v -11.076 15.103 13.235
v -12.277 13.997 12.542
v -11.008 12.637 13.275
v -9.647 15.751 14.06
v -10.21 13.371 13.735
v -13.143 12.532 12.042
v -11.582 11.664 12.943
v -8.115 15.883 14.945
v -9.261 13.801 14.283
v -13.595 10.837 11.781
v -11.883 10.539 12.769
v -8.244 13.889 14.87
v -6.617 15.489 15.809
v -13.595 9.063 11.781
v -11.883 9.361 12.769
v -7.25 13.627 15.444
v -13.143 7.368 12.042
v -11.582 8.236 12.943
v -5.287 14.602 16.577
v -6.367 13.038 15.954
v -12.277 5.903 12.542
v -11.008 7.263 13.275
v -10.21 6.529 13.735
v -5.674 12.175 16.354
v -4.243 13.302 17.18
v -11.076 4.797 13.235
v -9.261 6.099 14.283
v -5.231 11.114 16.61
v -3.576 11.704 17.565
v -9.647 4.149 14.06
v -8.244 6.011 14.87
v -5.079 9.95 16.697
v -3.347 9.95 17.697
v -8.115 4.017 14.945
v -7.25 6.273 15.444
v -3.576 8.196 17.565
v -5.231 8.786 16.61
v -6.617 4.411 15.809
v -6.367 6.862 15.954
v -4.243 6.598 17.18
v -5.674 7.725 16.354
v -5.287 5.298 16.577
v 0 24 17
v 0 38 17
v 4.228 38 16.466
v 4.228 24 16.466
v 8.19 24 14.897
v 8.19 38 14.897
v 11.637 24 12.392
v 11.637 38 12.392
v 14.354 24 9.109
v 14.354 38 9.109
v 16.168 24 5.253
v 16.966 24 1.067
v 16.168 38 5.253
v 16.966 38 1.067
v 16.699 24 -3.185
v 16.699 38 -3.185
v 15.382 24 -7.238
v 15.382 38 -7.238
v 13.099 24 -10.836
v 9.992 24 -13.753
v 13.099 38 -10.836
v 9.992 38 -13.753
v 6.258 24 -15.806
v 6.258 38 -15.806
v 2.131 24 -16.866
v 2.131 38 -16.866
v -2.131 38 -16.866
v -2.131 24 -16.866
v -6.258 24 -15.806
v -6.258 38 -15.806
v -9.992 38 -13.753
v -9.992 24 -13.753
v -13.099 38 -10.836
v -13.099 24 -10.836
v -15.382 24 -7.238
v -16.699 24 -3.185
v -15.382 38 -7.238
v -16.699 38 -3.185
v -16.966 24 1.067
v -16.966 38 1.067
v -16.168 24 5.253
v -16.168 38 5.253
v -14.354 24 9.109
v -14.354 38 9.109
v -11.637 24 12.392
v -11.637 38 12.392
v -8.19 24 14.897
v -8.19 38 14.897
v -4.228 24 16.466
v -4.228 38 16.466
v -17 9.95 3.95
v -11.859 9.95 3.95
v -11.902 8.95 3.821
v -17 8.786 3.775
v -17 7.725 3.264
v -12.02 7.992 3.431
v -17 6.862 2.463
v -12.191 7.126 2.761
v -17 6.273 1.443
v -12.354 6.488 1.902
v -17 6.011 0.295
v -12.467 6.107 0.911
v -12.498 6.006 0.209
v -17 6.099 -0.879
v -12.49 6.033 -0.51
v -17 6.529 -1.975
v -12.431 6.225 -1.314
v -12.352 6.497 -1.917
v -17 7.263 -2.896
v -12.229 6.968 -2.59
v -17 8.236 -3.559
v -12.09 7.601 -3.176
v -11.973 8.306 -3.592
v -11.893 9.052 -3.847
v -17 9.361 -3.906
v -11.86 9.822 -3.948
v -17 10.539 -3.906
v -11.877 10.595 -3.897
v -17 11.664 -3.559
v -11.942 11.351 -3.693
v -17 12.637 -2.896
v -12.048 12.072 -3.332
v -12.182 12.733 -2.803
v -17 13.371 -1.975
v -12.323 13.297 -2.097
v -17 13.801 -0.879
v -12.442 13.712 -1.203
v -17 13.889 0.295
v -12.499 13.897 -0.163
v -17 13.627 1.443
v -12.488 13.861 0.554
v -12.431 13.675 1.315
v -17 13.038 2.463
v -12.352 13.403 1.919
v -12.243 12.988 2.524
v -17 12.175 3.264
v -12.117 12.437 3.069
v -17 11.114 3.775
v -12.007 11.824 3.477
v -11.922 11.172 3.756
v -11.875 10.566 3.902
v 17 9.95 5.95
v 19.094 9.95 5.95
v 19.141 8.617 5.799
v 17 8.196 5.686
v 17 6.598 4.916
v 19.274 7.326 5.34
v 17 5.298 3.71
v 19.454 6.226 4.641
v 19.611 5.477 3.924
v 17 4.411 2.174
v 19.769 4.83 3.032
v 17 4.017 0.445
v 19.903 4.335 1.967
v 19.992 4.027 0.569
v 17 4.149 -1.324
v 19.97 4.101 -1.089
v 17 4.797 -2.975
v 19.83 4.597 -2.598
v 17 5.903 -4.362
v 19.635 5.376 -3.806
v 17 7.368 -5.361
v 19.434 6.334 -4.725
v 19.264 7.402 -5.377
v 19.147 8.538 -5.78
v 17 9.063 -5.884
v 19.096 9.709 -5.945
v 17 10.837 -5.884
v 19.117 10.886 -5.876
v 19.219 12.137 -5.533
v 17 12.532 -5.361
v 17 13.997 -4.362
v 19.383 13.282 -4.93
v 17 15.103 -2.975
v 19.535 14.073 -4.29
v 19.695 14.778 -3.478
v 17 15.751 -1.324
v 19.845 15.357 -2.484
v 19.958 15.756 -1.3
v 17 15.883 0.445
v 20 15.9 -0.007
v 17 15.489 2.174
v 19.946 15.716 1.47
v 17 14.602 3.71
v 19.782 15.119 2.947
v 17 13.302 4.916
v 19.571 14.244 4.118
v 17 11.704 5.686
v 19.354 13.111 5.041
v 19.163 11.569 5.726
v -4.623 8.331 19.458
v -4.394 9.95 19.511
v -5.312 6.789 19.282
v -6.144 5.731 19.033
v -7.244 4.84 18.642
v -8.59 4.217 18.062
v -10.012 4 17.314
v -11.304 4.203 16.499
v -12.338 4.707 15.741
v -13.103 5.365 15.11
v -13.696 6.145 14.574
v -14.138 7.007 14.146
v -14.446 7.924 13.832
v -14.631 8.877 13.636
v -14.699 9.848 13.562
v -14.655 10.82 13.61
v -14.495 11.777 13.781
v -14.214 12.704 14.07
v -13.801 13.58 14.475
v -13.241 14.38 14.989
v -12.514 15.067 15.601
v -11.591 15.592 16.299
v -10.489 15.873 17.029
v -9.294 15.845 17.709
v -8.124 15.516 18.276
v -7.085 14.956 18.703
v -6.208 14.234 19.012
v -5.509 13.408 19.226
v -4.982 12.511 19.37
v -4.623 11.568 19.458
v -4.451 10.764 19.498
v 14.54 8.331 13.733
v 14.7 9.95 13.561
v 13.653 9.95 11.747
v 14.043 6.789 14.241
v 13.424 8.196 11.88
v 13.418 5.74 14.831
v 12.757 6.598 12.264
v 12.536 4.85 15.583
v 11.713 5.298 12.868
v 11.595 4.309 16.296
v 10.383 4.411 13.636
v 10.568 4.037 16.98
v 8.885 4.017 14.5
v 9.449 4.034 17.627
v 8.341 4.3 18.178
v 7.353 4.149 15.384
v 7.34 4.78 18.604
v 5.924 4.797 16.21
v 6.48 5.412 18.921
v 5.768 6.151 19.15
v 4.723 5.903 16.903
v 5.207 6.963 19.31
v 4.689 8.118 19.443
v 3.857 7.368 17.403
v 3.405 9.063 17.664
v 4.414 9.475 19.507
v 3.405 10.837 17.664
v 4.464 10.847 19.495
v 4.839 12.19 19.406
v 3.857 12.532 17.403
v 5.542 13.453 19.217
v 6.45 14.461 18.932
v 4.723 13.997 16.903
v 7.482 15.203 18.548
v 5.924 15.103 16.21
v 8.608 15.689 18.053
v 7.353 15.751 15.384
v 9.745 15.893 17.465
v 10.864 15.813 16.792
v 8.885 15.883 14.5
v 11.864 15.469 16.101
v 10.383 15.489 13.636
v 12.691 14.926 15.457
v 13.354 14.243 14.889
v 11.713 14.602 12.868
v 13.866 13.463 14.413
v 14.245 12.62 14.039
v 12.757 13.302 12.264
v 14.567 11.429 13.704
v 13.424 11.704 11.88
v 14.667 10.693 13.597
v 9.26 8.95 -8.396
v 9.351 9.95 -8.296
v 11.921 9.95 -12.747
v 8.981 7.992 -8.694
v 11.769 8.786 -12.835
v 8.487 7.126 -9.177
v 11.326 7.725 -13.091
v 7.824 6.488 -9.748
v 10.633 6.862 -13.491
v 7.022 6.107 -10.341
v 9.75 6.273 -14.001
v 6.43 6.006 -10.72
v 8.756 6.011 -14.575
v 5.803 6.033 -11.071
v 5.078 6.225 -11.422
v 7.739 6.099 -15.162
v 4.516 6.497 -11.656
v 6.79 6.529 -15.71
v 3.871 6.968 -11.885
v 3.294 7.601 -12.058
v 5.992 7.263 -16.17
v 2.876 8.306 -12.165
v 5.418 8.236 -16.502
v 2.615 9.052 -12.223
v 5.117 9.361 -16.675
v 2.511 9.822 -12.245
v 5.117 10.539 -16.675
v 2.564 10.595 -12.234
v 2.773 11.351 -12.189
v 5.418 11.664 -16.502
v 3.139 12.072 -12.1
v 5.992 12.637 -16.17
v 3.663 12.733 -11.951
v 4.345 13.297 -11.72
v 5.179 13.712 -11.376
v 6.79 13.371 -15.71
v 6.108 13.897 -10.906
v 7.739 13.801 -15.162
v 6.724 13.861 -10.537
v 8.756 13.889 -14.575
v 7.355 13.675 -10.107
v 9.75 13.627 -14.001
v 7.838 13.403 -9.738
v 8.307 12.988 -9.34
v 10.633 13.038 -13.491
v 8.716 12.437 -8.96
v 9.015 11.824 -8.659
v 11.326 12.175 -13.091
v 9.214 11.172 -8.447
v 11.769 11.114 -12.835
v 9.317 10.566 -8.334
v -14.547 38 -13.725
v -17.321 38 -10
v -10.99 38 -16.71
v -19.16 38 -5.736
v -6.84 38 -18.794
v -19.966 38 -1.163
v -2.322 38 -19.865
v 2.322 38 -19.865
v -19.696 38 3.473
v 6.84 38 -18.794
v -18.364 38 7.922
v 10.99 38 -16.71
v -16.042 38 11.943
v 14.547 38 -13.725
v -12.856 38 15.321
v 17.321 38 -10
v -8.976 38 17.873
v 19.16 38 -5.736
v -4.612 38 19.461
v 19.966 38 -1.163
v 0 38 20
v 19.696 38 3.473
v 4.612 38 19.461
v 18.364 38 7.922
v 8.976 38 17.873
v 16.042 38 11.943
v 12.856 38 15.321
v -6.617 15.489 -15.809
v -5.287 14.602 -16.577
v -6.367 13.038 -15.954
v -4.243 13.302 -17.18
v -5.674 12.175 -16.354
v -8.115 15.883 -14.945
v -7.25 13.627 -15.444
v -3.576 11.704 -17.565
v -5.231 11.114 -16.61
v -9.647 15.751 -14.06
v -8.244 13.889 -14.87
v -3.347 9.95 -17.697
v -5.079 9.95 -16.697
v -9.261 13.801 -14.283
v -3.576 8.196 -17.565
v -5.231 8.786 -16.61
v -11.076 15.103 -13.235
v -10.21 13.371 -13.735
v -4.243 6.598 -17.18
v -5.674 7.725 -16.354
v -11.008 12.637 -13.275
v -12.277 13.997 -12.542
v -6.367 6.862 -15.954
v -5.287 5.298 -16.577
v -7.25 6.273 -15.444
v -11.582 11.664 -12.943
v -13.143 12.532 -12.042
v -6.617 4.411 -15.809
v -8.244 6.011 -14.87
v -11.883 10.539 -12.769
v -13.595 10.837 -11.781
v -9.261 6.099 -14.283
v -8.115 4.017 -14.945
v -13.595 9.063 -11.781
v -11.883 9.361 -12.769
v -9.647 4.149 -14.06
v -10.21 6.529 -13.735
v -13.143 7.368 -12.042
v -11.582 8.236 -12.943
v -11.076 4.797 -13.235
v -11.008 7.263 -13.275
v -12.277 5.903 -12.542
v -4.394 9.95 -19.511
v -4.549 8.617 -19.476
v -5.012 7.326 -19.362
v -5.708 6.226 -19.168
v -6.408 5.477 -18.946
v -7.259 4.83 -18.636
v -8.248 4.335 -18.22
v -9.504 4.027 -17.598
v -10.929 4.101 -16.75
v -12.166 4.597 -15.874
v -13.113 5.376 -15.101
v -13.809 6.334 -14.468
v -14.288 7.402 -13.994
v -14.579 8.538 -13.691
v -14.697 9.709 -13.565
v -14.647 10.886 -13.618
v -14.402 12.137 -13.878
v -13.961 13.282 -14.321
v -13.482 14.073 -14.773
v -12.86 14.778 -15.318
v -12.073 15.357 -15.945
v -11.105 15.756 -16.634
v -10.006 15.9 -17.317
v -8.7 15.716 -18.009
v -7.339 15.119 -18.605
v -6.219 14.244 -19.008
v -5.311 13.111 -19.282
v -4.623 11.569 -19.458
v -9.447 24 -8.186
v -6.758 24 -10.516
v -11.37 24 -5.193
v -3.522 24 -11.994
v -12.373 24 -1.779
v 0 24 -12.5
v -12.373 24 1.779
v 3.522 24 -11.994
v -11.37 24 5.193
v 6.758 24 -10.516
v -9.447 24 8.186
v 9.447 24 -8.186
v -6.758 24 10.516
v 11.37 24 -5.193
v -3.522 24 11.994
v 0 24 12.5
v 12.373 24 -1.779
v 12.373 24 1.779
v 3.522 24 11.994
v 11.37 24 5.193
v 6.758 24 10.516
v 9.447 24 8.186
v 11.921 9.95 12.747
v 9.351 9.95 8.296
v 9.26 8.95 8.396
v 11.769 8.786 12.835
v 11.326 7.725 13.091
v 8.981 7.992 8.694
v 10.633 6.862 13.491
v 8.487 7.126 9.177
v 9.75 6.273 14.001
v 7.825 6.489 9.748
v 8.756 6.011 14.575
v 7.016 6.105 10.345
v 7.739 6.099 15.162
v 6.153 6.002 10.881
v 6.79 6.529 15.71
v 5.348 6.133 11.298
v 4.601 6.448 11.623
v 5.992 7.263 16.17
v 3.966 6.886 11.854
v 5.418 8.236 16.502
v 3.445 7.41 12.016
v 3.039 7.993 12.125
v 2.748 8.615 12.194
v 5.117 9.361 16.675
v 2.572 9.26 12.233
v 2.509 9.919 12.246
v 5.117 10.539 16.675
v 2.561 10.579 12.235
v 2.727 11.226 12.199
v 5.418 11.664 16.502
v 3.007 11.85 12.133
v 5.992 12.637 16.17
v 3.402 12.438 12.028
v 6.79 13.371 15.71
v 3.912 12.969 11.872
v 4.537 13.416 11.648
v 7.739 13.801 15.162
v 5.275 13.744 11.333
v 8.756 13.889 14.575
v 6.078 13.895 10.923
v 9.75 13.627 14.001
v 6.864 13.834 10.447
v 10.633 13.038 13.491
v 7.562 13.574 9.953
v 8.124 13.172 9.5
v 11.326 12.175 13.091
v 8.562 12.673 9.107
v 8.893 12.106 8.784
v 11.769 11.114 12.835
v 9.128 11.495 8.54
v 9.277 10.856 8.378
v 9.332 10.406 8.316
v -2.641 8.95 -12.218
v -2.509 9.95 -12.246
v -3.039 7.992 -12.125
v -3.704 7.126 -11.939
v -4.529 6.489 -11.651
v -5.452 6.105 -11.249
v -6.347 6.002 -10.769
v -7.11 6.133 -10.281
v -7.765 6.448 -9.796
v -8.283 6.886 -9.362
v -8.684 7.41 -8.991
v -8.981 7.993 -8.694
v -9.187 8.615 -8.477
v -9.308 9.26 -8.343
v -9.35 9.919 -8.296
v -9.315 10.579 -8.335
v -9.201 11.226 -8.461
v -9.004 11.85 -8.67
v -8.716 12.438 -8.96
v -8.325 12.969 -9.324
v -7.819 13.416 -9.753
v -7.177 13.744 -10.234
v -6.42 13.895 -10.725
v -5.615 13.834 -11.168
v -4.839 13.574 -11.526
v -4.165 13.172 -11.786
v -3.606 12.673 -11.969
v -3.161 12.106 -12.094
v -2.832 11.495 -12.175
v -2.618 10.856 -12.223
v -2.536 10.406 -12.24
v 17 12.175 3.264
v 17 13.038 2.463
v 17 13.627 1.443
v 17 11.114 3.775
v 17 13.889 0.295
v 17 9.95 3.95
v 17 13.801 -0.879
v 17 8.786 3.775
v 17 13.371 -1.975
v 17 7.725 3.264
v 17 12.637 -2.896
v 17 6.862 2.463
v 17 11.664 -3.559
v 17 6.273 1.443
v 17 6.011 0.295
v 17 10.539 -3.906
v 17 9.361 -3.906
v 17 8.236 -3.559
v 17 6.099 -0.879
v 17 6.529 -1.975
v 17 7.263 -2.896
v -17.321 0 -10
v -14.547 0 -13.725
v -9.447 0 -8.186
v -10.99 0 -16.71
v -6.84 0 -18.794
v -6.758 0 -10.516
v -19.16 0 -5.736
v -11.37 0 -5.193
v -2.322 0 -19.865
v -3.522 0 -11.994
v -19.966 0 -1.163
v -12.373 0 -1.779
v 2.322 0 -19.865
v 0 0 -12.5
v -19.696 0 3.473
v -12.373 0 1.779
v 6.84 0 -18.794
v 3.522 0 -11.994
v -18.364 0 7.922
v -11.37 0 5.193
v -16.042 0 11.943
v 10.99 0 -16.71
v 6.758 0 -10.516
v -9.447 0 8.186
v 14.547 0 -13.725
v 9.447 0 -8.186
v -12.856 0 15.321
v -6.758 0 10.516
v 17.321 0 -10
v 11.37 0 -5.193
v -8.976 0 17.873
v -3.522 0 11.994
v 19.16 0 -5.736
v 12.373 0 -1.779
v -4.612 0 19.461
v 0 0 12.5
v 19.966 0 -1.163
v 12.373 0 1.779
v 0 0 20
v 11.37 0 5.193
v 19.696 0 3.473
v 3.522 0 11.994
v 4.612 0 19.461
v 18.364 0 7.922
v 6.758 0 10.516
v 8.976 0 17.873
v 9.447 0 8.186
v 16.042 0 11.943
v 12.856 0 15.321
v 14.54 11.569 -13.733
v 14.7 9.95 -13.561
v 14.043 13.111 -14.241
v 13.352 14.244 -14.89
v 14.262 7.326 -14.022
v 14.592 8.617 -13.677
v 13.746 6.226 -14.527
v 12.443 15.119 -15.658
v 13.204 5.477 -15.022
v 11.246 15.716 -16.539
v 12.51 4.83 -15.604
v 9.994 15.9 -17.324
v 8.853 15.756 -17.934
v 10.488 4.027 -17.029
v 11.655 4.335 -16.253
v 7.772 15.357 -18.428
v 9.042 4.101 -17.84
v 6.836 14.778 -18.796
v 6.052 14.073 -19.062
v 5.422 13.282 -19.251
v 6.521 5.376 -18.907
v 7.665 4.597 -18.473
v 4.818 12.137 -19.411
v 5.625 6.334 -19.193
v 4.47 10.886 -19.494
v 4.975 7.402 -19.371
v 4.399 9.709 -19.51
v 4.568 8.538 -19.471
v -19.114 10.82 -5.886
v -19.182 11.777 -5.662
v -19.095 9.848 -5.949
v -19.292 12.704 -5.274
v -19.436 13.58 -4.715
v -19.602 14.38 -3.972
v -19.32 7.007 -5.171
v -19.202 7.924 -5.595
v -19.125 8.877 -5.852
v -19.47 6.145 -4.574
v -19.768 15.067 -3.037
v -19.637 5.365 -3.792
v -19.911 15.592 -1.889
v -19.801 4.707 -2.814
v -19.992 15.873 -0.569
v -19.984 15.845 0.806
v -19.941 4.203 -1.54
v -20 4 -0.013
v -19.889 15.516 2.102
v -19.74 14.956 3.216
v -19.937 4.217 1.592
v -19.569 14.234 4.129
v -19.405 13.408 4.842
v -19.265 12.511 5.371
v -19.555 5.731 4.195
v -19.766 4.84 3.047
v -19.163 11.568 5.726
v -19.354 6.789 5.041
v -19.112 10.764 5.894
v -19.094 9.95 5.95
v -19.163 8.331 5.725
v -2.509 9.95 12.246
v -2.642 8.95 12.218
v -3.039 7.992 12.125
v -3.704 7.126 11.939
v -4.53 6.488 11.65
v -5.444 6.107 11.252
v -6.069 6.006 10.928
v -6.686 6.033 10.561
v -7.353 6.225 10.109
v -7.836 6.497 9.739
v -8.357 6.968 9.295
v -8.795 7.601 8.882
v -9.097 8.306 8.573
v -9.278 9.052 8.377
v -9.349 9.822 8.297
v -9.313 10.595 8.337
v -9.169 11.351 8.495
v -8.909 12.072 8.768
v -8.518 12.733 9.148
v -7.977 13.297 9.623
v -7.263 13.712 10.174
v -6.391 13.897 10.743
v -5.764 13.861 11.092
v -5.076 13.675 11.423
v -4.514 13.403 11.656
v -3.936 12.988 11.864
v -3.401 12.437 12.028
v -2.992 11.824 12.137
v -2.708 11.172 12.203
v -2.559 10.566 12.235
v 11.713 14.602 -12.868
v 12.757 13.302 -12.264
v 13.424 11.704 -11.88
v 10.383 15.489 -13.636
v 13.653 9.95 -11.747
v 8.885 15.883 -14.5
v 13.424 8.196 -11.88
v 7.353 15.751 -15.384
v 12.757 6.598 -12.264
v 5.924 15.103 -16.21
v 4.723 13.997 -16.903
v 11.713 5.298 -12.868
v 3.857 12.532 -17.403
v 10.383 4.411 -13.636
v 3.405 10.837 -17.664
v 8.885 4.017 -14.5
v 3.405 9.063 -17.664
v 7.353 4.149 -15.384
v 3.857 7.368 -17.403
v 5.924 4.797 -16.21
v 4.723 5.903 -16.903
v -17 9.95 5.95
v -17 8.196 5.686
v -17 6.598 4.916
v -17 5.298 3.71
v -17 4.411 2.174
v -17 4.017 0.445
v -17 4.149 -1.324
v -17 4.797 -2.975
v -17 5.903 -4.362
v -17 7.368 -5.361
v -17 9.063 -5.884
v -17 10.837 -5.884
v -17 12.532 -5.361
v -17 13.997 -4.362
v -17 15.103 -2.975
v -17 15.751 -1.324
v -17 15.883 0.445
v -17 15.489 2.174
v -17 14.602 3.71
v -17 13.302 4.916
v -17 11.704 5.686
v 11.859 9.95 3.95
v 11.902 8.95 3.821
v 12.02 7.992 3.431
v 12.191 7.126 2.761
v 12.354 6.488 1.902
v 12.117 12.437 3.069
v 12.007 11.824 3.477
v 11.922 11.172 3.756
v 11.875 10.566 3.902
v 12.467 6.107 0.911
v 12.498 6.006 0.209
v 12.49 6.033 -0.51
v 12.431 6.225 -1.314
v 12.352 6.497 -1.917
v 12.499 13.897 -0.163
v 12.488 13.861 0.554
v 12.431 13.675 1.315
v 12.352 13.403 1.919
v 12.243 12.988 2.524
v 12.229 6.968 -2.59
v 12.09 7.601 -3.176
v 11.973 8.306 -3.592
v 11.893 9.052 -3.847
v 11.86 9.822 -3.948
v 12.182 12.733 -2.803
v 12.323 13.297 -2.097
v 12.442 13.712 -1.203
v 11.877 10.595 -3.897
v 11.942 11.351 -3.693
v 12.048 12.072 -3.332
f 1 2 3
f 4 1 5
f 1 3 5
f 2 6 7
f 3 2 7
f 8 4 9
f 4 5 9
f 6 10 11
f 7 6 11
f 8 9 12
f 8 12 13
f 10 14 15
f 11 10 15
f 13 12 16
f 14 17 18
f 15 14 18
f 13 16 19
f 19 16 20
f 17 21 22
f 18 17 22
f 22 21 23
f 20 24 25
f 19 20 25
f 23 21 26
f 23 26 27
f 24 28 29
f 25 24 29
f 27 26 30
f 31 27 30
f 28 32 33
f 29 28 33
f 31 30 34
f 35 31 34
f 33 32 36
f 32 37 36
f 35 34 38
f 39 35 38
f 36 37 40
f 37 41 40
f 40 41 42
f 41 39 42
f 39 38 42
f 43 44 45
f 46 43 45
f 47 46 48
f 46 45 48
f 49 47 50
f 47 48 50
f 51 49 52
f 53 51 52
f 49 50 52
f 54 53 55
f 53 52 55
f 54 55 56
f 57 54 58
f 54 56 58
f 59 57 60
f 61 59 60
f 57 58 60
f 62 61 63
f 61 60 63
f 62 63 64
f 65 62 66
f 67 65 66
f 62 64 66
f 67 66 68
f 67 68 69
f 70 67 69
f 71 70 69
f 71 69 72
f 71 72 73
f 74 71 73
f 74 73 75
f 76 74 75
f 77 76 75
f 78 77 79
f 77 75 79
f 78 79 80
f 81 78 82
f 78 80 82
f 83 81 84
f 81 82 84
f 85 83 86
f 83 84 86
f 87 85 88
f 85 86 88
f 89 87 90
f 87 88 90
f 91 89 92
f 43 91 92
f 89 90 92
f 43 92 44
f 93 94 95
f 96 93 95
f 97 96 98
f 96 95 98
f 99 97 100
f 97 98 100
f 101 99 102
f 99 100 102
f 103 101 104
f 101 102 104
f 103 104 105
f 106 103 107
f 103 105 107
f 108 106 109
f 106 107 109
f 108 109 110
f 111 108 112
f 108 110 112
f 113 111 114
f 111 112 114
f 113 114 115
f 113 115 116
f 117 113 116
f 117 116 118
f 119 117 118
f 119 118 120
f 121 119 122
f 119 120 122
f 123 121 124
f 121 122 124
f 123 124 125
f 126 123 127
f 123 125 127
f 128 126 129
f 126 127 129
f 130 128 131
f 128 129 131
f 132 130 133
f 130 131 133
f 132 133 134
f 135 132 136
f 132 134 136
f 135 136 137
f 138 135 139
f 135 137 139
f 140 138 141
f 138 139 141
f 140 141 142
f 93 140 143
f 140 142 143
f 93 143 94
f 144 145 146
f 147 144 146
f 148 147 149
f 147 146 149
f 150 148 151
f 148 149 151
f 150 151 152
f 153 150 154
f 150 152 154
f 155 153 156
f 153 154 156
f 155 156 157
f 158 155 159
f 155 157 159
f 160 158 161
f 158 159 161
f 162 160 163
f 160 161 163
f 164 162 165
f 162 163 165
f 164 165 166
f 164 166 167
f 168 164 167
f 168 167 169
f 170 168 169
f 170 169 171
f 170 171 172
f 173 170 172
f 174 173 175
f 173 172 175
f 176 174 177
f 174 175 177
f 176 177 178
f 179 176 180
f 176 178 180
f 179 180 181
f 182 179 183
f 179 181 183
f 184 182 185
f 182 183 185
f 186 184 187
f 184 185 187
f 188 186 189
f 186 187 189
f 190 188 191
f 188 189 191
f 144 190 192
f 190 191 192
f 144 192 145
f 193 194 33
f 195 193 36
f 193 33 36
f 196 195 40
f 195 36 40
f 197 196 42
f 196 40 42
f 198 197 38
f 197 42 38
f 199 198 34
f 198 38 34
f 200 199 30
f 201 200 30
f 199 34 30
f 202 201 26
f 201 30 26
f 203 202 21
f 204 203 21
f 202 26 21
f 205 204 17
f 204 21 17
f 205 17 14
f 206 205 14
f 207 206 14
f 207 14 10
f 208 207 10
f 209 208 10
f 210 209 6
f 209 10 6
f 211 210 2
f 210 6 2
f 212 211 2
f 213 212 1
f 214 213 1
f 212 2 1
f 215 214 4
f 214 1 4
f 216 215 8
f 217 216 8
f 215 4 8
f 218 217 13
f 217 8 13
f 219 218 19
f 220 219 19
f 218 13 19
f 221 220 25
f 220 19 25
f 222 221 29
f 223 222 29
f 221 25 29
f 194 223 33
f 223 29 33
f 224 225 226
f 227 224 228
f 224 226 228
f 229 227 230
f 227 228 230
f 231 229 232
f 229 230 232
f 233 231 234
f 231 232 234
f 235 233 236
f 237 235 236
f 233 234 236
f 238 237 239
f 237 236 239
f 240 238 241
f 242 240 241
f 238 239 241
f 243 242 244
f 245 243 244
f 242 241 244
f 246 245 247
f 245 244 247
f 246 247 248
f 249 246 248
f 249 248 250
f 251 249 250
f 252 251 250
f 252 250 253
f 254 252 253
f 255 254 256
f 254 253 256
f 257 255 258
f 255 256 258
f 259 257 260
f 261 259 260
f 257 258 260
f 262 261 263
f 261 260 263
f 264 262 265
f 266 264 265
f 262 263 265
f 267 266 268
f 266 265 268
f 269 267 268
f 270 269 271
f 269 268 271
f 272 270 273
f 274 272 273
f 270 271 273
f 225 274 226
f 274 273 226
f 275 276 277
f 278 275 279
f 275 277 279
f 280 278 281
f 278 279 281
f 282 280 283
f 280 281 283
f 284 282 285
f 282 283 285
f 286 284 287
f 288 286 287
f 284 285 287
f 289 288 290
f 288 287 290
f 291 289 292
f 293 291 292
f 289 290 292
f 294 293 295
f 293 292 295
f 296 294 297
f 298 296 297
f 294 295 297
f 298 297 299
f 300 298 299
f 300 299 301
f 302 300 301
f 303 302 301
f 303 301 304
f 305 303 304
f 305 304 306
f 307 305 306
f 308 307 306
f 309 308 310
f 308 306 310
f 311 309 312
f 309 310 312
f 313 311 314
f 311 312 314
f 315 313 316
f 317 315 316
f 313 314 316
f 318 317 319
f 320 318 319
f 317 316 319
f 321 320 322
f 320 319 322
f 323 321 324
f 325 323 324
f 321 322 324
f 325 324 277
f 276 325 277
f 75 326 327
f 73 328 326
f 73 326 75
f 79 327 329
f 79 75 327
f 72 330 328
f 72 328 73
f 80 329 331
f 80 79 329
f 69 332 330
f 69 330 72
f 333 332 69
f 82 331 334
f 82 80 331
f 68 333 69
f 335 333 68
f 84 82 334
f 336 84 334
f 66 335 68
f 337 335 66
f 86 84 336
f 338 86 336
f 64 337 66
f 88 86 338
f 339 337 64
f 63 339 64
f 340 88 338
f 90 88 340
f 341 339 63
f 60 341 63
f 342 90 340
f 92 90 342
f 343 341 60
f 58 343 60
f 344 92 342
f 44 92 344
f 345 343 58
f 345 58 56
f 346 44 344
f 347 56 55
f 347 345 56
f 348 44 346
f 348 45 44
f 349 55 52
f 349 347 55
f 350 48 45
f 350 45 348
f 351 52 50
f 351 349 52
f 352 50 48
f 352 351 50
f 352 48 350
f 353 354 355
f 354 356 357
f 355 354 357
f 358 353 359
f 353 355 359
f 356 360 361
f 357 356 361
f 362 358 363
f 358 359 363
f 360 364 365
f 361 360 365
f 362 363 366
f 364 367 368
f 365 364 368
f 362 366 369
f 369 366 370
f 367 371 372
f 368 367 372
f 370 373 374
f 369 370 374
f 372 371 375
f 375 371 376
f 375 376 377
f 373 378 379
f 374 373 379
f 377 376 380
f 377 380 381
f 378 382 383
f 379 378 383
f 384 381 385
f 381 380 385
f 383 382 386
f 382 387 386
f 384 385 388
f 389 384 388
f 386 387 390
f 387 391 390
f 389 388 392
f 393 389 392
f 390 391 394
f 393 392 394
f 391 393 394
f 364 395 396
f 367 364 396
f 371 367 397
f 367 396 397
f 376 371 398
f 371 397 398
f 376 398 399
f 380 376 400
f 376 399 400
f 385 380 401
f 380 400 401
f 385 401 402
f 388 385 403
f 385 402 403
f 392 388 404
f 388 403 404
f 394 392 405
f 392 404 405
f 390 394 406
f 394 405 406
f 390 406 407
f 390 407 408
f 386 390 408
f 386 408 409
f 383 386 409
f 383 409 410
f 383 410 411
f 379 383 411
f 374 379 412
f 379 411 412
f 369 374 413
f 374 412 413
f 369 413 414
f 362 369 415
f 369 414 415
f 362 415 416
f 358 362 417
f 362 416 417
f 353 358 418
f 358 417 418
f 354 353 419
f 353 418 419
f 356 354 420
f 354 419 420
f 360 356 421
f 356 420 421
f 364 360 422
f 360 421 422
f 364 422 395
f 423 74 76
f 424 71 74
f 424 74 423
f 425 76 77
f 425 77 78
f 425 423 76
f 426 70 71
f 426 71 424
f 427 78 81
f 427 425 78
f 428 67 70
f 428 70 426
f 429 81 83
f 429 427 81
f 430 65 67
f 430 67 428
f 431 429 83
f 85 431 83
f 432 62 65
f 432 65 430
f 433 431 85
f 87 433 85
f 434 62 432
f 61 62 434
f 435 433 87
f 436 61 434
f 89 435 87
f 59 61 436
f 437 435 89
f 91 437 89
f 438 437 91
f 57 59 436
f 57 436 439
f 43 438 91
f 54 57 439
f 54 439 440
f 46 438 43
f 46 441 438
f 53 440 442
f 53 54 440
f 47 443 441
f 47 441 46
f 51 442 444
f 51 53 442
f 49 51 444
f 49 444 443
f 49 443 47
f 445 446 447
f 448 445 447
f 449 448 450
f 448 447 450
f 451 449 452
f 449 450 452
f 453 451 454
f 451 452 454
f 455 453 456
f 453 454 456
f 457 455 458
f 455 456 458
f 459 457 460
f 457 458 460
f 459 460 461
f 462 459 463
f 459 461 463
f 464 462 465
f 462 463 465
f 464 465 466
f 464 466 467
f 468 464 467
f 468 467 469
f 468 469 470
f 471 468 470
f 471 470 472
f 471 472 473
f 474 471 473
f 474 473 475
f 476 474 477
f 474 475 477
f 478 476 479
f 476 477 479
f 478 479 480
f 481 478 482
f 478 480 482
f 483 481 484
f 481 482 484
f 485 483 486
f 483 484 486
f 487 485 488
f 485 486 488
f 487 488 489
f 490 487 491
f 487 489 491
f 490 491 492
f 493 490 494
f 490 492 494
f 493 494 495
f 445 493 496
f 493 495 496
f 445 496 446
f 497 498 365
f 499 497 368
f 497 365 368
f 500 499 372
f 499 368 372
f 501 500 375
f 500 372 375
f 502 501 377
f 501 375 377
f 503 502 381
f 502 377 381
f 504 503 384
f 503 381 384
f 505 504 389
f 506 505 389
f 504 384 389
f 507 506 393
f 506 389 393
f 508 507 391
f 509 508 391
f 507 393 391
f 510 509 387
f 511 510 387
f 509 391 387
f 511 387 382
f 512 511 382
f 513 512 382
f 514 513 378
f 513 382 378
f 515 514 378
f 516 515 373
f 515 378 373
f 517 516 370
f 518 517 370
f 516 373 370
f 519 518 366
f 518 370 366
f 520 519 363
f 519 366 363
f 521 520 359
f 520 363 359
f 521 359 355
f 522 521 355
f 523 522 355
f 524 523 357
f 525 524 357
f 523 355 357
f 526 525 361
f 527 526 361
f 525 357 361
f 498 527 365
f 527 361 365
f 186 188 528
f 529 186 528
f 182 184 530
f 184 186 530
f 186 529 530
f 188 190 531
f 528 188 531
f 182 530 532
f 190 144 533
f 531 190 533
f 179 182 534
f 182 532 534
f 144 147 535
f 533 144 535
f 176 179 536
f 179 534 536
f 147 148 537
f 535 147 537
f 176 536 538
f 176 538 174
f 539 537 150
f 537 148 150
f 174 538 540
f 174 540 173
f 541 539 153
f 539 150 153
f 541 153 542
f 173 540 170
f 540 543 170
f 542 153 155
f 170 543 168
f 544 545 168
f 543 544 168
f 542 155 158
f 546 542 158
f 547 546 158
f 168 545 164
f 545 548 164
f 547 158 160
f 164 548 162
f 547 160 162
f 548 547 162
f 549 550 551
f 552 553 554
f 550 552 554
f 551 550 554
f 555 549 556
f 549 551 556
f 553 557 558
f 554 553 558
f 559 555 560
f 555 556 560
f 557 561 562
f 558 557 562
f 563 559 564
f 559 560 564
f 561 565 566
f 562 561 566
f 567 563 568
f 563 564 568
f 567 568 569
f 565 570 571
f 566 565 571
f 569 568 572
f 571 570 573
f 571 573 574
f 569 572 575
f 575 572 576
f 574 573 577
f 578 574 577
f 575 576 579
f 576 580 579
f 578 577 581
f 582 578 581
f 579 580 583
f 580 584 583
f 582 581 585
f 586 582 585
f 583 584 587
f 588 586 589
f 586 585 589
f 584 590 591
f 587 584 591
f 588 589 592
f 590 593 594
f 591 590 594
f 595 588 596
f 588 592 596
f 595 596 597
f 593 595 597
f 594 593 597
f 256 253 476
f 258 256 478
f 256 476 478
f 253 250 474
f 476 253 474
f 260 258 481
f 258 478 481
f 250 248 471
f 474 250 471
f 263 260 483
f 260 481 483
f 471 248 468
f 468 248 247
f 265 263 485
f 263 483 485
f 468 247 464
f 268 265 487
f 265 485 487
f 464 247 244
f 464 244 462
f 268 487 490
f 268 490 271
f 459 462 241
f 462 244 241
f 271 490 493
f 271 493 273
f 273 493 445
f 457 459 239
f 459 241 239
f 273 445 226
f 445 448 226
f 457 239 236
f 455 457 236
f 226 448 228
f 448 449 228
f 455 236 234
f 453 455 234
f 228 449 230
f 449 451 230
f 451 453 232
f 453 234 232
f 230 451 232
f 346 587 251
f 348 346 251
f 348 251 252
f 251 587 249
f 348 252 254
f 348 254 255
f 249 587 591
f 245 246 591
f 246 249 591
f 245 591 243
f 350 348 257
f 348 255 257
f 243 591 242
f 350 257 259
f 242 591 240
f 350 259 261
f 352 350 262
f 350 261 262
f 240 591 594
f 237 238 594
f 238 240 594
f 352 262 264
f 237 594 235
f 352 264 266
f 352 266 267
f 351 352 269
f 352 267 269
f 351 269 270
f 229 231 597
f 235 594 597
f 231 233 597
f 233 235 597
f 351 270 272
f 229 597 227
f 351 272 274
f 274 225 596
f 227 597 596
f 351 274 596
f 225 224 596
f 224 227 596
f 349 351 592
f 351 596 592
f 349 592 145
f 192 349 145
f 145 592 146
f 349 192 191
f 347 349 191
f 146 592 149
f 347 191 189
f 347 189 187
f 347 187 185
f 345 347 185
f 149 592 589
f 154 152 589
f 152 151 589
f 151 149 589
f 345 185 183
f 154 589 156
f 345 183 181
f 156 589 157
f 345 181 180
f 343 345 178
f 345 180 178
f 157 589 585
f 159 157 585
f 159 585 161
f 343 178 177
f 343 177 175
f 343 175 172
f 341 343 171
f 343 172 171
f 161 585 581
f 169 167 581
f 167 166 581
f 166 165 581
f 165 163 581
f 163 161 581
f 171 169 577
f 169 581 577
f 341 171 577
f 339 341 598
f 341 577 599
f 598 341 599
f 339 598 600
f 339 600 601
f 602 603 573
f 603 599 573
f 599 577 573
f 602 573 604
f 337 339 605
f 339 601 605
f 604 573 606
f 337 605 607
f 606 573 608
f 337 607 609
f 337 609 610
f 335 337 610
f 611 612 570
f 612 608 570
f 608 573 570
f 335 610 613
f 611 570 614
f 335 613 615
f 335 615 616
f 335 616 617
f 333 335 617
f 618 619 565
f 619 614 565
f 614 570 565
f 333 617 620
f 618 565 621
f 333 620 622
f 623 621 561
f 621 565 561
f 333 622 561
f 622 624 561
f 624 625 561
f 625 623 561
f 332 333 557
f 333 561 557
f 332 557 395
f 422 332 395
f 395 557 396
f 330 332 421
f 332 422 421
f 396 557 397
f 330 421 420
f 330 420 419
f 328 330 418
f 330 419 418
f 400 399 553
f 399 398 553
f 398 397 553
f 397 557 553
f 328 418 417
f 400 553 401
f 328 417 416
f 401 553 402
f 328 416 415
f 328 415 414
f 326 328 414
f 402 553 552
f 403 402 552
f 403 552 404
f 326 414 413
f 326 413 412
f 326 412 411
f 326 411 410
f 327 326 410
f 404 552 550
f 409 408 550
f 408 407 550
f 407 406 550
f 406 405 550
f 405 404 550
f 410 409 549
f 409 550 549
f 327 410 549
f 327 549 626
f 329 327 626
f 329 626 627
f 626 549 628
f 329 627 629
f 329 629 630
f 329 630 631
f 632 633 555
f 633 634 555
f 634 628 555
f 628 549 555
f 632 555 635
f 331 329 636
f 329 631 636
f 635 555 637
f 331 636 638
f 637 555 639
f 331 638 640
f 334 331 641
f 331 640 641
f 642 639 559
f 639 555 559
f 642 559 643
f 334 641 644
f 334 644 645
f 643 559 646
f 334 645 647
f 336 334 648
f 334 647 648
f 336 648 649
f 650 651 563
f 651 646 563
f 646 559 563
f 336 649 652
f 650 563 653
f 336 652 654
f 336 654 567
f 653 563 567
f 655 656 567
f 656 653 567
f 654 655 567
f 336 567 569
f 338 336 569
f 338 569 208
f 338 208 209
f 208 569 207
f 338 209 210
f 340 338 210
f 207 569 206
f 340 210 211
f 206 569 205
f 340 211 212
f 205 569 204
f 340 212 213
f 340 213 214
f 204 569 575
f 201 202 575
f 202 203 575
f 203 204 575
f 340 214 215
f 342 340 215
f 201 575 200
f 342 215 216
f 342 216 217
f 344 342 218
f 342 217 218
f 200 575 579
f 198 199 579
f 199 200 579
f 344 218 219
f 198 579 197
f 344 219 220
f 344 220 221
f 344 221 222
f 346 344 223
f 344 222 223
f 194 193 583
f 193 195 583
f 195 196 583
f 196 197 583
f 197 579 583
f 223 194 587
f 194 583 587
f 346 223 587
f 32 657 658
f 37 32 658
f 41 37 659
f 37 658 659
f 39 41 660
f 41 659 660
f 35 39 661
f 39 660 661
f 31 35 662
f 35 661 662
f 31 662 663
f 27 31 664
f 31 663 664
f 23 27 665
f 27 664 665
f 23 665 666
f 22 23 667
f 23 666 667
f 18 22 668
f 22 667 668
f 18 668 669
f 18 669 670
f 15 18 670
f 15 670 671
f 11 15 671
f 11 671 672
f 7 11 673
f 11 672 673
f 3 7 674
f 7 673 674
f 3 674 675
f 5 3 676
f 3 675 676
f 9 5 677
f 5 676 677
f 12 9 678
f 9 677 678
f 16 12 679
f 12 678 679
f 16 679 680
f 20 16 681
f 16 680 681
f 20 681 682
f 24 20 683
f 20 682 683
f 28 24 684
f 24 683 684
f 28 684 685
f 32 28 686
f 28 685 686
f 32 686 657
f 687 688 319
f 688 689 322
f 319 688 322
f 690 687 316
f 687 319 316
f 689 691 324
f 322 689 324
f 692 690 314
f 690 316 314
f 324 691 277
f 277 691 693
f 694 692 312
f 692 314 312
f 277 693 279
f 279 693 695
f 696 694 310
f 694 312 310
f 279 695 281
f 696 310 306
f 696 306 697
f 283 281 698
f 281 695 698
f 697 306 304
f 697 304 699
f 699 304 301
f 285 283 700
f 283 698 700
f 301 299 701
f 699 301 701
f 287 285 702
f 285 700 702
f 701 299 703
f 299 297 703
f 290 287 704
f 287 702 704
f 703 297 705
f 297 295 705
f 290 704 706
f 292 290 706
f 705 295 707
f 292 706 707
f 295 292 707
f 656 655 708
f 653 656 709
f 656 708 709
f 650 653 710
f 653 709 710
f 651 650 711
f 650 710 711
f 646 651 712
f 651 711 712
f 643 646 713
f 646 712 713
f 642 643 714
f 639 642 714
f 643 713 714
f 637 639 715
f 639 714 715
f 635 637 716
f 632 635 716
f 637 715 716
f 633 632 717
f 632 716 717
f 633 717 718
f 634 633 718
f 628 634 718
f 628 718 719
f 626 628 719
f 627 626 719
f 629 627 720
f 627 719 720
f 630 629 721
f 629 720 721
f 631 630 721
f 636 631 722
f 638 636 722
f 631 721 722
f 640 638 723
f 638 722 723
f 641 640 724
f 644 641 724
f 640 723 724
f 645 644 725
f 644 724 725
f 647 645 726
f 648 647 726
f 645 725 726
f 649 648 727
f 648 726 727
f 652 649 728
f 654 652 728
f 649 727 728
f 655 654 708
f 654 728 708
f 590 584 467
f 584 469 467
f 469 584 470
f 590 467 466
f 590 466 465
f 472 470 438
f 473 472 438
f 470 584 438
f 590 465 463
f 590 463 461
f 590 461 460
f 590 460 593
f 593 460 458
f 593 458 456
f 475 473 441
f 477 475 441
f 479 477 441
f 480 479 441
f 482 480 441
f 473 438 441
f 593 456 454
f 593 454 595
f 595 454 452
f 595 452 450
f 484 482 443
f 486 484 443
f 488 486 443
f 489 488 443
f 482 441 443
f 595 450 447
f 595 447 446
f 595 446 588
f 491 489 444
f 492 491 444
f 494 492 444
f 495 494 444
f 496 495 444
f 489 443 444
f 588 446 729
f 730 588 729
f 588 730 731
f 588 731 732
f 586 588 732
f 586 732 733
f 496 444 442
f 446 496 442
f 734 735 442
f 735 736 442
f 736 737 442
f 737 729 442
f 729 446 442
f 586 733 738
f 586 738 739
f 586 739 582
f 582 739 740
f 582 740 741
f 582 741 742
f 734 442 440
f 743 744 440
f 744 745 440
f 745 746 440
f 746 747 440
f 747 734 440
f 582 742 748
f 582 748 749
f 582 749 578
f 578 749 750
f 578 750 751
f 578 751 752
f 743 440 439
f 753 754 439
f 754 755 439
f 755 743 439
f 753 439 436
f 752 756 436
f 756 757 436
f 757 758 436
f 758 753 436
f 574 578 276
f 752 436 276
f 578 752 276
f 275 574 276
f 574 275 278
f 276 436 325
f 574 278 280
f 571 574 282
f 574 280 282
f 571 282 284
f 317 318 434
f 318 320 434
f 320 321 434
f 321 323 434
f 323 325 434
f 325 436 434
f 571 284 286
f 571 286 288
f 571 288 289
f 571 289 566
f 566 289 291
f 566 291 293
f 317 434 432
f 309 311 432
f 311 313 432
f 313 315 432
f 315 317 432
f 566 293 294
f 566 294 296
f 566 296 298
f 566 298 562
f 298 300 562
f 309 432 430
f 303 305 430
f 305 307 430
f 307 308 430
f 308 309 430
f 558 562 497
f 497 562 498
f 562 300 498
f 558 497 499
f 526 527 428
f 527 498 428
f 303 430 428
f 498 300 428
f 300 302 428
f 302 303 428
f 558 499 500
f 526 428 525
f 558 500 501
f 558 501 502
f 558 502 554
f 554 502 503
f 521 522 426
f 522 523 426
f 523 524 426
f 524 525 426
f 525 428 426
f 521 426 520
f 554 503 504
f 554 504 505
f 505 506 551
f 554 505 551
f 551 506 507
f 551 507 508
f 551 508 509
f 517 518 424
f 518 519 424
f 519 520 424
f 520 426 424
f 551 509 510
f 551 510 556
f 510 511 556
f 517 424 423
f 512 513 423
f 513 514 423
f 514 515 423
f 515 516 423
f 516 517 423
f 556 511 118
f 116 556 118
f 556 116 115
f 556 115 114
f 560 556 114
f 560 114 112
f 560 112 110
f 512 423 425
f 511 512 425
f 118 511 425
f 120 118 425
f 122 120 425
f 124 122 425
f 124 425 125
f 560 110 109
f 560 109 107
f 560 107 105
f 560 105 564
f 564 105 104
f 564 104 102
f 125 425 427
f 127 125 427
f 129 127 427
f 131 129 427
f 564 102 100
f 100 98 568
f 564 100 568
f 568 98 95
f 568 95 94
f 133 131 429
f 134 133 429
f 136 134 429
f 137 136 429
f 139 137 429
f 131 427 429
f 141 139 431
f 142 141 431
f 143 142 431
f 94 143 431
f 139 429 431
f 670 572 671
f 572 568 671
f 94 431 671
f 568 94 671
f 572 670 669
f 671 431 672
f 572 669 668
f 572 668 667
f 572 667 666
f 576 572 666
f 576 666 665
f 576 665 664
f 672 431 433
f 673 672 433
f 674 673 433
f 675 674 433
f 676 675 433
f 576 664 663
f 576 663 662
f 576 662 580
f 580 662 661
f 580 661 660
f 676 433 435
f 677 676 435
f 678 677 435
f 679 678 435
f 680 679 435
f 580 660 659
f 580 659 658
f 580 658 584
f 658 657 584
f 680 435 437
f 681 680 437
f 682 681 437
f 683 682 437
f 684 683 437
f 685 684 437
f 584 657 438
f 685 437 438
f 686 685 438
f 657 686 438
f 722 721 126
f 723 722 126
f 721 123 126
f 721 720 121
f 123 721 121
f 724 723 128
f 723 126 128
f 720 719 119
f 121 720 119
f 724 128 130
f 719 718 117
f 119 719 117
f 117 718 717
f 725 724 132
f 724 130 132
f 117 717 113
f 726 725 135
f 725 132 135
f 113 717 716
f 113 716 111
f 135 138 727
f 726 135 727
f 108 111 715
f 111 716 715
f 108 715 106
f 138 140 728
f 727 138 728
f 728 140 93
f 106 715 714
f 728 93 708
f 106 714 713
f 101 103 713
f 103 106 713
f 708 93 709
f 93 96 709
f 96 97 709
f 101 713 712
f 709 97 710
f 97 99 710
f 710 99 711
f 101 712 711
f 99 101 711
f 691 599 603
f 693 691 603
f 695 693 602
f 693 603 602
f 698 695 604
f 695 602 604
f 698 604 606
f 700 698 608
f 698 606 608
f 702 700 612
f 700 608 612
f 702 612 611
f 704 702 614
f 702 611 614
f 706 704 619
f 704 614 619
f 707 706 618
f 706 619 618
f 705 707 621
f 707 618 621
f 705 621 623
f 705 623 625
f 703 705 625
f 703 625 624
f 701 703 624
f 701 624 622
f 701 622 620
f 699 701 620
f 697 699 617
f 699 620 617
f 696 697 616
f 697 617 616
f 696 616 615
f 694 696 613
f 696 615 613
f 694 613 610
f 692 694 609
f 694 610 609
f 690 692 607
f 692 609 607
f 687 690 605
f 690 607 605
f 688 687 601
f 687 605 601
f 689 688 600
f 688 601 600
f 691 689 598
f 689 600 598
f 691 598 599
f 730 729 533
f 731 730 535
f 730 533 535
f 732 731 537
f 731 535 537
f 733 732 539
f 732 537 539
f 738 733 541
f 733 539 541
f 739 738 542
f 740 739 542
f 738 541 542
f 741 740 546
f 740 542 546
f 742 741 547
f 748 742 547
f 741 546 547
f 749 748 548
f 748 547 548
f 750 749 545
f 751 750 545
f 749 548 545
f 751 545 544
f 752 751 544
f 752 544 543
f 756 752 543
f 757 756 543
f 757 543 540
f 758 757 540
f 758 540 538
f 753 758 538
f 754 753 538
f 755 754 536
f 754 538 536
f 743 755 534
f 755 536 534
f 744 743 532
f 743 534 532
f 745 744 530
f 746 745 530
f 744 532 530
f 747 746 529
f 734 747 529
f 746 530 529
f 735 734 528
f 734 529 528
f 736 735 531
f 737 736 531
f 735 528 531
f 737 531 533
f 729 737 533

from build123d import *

# Parameters (mm, degrees)
SKETCH1_R           = 20
BOSS_EXTRUDE1_DEPTH = 38
SKETCH2_R           = 12.5
CUT_EXTRUDE1_DEPTH  = 38
SKETCH3_R           = 17
CUT_EXTRUDE2_DEPTH  = 14


with BuildPart() as part:
    # Sketch1 → Boss-Extrude1 (new body)
    with BuildSketch(Plane(origin=(0, 0, 0), x_dir=(1, 0, 0), z_dir=(0, 1, 0))):
        with Locations(Location((0, 0, 0), (0, 0, 270))):
            Circle(SKETCH1_R)
    extrude(amount=BOSS_EXTRUDE1_DEPTH)

    # Sketch2 → Cut-Extrude1 (cut)
    with BuildSketch(Plane(origin=(0, 38, 0), x_dir=(1, 0, 0), z_dir=(0, 1, 0))):
        with Locations(Location((0, 0, 0), (0, 0, 270))):
            Circle(SKETCH2_R)
    extrude(amount=-CUT_EXTRUDE1_DEPTH, mode=Mode.SUBTRACT)

    # Sketch3 → Cut-Extrude2 (cut)
    with BuildSketch(Plane(origin=(0, 38, 0), x_dir=(1, 0, 0), z_dir=(0, 1, 0))):
        with Locations(Location((0, 0, 0), (0, 0, 270))):
            Circle(SKETCH3_R)
    extrude(amount=-CUT_EXTRUDE2_DEPTH, mode=Mode.SUBTRACT)

    # Sketch7 → Cut-Revolve4 (revolve, cut)
    with BuildSketch(Plane.XY, mode=Mode.PRIVATE) as cut_revolve4_sk:
        Polygon((-17, 6), (17, 6), (17, 4), (20, 4), (20, 9.95), (-20, 9.95), (-20, 4), (-17, 4), align=None)
    revolve(cut_revolve4_sk.sketch.rotate(Axis((-20, 9.95, 0), (1, 0, 0)), 270), axis=Axis((-20, 9.95, 0), (1, 0, 0)), mode=Mode.SUBTRACT)

    # Sketch10 → Cut-Revolve5 (revolve, cut)
    with BuildSketch(Plane(origin=(0, 0, 0), x_dir=(-0.5000000000000039, 0, -0.8660254037844365), z_dir=(0.8660254037844364, 0, -0.5000000000000038)), mode=Mode.PRIVATE) as cut_revolve5_sk:
        Polygon((-17, 6), (17, 6), (17, 4), (20, 4), (20, 9.95), (-20, 9.95), (-20, 4), (-17, 4), align=None)
    revolve(cut_revolve5_sk.sketch.rotate(Axis((10, 9.95, 17.320508076), (-0.5000000000000039, 0, -0.8660254037844365)), 270), axis=Axis((10, 9.95, 17.320508076), (-0.5000000000000039, 0, -0.8660254037844365)), mode=Mode.SUBTRACT)

    # Sketch11 → Cut-Revolve6 (revolve, cut)
    with BuildSketch(Plane(origin=(0, 0, 0), x_dir=(0.49999999999999833, 0, -0.8660254037844396), z_dir=(0.8660254037844397, 0, 0.4999999999999984)), mode=Mode.PRIVATE) as cut_revolve6_sk:
        Polygon((-17, 6), (17, 6), (17, 4), (20, 4), (20, 9.95), (-20, 9.95), (-20, 4), (-17, 4), align=None)
    revolve(cut_revolve6_sk.sketch.rotate(Axis((-10, 9.95, 17.320508076), (0.49999999999999833, 0, -0.8660254037844397)), 270), axis=Axis((-10, 9.95, 17.320508076), (0.49999999999999833, 0, -0.8660254037844397)), mode=Mode.SUBTRACT)


solid = part.part
